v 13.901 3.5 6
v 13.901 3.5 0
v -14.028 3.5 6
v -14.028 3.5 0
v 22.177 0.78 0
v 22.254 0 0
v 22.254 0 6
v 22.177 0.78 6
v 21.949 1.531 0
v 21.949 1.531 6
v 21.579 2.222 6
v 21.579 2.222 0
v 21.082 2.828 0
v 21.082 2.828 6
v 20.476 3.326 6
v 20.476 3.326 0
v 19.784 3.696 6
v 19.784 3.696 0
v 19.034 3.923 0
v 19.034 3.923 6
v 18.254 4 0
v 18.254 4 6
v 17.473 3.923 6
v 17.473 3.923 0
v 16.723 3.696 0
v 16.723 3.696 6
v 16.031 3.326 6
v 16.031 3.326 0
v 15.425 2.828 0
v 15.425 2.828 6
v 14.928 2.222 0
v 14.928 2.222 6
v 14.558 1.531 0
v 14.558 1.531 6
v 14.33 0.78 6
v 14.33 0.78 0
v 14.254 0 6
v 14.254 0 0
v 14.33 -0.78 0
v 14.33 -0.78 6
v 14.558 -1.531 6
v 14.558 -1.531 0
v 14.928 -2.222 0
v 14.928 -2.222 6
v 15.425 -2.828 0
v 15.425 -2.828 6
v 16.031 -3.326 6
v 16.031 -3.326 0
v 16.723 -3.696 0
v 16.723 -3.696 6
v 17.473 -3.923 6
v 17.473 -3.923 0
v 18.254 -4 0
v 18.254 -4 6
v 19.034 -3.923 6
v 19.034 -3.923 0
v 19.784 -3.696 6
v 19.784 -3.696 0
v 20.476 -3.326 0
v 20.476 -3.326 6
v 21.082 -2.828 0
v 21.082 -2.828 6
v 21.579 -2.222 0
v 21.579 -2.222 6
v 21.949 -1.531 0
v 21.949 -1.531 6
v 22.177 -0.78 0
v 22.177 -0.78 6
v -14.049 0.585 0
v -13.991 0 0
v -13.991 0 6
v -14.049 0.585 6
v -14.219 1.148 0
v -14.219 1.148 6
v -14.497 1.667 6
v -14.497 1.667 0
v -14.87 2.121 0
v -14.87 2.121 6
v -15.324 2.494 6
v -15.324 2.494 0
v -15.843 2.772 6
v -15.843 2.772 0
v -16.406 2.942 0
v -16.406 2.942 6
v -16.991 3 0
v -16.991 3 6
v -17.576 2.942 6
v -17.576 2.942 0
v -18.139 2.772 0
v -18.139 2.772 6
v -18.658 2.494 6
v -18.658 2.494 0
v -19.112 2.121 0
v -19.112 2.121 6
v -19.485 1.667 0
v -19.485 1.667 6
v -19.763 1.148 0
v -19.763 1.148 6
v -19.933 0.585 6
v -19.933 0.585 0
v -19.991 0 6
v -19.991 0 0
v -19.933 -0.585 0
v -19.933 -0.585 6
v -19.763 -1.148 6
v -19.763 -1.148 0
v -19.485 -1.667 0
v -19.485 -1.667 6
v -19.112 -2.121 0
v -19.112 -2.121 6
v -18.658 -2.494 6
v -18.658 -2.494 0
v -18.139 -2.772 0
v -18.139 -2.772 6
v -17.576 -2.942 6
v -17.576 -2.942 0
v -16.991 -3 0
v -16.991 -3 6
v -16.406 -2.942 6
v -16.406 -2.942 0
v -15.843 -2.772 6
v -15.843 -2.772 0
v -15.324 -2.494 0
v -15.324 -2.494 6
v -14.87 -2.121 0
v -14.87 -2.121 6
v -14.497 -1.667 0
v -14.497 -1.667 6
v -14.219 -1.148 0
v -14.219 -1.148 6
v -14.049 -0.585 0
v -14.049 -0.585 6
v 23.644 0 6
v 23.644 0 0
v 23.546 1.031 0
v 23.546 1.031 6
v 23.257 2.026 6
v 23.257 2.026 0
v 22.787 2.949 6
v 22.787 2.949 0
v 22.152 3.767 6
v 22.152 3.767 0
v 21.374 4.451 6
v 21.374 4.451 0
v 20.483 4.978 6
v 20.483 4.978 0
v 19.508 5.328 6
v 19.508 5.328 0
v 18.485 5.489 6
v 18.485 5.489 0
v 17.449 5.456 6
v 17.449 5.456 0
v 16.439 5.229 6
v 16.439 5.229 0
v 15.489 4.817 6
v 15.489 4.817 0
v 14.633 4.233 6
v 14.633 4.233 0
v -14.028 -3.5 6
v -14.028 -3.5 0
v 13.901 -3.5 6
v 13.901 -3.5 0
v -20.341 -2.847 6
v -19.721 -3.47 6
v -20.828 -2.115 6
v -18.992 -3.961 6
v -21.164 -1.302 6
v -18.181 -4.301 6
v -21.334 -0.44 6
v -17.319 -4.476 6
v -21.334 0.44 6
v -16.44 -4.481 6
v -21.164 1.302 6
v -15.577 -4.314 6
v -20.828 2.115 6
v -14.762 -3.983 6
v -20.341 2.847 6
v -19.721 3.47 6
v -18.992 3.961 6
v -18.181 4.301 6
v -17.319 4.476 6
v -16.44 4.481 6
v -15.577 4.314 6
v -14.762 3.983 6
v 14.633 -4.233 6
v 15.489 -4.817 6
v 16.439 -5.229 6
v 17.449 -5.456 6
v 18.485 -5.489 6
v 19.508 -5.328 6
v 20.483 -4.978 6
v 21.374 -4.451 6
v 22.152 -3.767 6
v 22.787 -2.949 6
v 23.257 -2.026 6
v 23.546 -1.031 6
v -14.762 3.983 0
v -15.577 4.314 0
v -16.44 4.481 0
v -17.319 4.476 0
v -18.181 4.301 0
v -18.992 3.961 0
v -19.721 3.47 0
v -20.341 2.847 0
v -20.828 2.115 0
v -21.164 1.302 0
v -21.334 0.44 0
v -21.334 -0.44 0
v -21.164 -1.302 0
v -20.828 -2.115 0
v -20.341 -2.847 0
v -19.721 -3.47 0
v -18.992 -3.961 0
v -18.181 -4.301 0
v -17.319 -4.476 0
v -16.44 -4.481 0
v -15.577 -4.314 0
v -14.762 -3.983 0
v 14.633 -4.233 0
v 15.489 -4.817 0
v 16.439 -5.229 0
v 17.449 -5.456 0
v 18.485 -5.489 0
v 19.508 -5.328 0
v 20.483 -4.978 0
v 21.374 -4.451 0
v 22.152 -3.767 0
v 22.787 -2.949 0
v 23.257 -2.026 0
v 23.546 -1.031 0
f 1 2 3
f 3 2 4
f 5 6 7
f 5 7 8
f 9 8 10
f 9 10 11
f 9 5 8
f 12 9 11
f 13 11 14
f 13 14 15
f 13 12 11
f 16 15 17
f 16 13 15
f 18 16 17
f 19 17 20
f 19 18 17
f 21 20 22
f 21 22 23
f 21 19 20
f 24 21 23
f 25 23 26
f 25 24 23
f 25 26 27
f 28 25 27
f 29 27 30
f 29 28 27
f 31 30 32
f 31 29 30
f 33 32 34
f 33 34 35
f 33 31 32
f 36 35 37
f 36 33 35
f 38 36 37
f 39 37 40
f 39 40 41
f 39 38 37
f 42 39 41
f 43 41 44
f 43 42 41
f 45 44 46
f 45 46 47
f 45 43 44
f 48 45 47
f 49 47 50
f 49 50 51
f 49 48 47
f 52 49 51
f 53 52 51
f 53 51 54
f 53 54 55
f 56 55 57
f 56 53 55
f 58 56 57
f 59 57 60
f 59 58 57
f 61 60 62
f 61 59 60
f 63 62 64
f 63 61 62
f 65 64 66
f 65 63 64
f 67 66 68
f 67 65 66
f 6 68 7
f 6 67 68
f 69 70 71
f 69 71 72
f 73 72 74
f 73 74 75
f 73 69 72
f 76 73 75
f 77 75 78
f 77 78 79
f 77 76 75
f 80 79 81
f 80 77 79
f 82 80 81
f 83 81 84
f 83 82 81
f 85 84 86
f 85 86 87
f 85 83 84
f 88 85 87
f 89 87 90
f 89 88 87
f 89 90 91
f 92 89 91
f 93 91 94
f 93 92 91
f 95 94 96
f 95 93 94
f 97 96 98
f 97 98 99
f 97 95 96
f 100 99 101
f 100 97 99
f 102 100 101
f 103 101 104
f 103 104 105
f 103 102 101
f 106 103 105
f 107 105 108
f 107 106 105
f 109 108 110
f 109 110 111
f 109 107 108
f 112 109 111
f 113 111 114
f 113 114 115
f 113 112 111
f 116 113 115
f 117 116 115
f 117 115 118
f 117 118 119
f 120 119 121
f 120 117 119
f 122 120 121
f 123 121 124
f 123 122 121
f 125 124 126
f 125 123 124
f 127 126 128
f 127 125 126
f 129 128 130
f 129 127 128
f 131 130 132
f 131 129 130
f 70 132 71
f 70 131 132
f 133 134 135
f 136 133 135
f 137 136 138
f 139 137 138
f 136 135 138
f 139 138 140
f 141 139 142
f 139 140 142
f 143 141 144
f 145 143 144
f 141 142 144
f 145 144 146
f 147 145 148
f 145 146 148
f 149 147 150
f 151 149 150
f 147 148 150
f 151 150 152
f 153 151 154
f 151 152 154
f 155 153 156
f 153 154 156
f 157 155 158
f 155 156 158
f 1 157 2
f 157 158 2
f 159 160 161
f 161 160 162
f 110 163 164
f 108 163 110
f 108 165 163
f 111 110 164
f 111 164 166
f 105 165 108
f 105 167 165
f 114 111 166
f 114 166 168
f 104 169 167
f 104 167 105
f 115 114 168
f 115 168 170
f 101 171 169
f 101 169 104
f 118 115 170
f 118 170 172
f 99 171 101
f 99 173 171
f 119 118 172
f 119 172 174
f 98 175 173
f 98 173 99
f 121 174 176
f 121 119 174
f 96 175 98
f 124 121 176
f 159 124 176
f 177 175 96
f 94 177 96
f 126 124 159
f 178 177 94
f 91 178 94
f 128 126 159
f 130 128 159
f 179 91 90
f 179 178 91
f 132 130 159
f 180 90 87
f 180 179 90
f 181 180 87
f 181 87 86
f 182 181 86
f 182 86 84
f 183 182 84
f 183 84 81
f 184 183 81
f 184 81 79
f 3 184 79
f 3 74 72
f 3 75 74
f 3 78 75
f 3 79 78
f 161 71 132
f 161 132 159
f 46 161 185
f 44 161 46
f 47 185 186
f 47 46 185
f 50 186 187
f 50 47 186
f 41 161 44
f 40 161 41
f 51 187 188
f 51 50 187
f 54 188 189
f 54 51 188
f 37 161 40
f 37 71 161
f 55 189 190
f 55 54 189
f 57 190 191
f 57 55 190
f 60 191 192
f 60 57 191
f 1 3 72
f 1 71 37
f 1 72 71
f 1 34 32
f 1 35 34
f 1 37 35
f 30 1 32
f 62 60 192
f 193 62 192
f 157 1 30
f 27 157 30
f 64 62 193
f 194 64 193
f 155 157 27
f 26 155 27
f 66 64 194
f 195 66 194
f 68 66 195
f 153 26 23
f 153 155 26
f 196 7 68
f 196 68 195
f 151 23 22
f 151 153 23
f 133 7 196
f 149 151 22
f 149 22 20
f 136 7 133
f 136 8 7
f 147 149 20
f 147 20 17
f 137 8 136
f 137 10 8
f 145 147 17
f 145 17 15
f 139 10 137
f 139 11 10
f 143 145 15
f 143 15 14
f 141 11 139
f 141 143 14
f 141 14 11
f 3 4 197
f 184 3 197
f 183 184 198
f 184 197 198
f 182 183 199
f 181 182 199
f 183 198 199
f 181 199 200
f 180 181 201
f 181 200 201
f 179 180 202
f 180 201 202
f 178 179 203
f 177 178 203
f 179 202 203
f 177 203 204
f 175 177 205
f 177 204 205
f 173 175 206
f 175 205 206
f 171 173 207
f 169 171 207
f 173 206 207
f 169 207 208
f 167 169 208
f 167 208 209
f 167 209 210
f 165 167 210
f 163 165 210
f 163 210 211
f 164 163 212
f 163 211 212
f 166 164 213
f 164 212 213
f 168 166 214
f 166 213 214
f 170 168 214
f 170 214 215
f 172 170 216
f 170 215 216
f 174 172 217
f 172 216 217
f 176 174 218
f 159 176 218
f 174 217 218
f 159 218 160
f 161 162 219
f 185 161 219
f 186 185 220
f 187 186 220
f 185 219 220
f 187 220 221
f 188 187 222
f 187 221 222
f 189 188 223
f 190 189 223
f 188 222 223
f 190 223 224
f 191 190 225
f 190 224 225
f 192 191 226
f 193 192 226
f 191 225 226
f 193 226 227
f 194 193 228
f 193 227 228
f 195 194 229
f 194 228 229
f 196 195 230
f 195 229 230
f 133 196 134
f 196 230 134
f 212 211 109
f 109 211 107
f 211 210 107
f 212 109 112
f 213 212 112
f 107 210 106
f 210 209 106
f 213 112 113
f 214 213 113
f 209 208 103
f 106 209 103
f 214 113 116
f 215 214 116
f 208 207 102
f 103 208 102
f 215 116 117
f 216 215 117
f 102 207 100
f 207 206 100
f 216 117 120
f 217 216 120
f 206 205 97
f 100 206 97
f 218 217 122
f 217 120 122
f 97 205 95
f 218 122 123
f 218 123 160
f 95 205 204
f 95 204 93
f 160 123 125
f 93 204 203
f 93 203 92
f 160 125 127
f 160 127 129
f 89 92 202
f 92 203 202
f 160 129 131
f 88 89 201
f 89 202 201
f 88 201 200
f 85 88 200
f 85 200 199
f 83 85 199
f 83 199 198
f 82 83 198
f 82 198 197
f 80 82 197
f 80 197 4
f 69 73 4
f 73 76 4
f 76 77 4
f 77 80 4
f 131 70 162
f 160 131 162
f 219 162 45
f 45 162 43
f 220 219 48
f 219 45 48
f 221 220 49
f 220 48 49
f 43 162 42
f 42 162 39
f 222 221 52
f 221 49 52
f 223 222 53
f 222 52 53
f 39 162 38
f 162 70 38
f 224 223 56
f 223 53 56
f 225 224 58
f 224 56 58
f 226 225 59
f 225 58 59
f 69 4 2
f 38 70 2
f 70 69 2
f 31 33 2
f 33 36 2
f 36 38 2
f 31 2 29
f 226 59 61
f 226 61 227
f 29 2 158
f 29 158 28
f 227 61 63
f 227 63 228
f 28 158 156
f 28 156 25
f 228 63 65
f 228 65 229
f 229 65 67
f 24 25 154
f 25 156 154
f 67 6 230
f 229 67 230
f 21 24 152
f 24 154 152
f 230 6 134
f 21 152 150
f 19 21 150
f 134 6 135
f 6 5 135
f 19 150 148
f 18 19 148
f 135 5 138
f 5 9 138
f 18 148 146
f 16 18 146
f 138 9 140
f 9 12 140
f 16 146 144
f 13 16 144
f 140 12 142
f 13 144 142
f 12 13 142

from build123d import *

# Parameters (mm, degrees)
BOSS_EXTRUDE2_DEPTH      = 6
CUT_EXTRUDE1_OUTLINE_R   = 4
CUT_EXTRUDE1_OUTLINE_R_2 = 3
CUT_EXTRUDE1_DEPTH       = 6


# Read off the part's stored shape, not the designer's step: Cut-Extrude1
with BuildPart() as part:
    # Sketch1 → Boss-Extrude2 (new body)
    with BuildSketch(Plane.XY):
        with BuildLine():
            Line((-15.512, -3.5), (-15.512, 3.5))
            Line((-15.512, 3.5), (-14.027572875, 3.5))
            ThreePointArc((-14.027572875, 3.5), (-21.356, 0), (-14.027572875, -3.5))
            Line((-14.027572875, -3.5), (-15.512, -3.5))
        make_face()
        with BuildLine():
            Line((-14.027572875, 3.5), (-15.512, 3.5))
            Line((-15.512, 3.5), (-15.512, -3.5))
            Line((-15.512, -3.5), (-14.027572875, -3.5))
            ThreePointArc((-14.027572875, -3.5), (-12.795339828, -1.939339828), (-12.356, 0))
            ThreePointArc((-12.356, 0), (-12.795339828, 1.939339828), (-14.027572875, 3.5))
        make_face()
        with BuildLine():
            Line((13.901359313, 3.5), (-14.027572875, 3.5))
            ThreePointArc((-14.027572875, 3.5), (-12.795339828, 1.939339828), (-12.356, 0))
            ThreePointArc((-12.356, 0), (-12.795339828, -1.939339828), (-14.027572875, -3.5))
            Line((-14.027572875, -3.5), (13.901359313, -3.5))
            ThreePointArc((13.901359313, -3.5), (12.644, 0), (13.901359313, 3.5))
        make_face()
        with BuildLine():
            ThreePointArc((23.644, 0), (20.003499425, 5.176124215), (13.901359313, 3.5))
            Line((13.901359313, 3.5), (15.512, 3.5))
            Line((15.512, 3.5), (15.512, -3.5))
            Line((15.512, -3.5), (13.901359313, -3.5))
            ThreePointArc((13.901359313, -3.5), (20.003499425, -5.176124215), (23.644, 0))
        make_face()
        with BuildLine():
            Line((15.512, 3.5), (13.901359313, 3.5))
            ThreePointArc((13.901359313, 3.5), (12.644, 0), (13.901359313, -3.5))
            Line((13.901359313, -3.5), (15.512, -3.5))
            Line((15.512, -3.5), (15.512, 3.5))
        make_face()
    extrude(amount=BOSS_EXTRUDE2_DEPTH)

    # Cut-Extrude1 outline → Cut-Extrude1 (cut)
    with BuildSketch(Plane.XY):
        with Locations((18.253573905, 0)):
            Circle(CUT_EXTRUDE1_OUTLINE_R)
        with Locations((-16.991061145, 0)):
            Circle(CUT_EXTRUDE1_OUTLINE_R_2)
    extrude(amount=CUT_EXTRUDE1_DEPTH, mode=Mode.SUBTRACT)


solid = part.part
